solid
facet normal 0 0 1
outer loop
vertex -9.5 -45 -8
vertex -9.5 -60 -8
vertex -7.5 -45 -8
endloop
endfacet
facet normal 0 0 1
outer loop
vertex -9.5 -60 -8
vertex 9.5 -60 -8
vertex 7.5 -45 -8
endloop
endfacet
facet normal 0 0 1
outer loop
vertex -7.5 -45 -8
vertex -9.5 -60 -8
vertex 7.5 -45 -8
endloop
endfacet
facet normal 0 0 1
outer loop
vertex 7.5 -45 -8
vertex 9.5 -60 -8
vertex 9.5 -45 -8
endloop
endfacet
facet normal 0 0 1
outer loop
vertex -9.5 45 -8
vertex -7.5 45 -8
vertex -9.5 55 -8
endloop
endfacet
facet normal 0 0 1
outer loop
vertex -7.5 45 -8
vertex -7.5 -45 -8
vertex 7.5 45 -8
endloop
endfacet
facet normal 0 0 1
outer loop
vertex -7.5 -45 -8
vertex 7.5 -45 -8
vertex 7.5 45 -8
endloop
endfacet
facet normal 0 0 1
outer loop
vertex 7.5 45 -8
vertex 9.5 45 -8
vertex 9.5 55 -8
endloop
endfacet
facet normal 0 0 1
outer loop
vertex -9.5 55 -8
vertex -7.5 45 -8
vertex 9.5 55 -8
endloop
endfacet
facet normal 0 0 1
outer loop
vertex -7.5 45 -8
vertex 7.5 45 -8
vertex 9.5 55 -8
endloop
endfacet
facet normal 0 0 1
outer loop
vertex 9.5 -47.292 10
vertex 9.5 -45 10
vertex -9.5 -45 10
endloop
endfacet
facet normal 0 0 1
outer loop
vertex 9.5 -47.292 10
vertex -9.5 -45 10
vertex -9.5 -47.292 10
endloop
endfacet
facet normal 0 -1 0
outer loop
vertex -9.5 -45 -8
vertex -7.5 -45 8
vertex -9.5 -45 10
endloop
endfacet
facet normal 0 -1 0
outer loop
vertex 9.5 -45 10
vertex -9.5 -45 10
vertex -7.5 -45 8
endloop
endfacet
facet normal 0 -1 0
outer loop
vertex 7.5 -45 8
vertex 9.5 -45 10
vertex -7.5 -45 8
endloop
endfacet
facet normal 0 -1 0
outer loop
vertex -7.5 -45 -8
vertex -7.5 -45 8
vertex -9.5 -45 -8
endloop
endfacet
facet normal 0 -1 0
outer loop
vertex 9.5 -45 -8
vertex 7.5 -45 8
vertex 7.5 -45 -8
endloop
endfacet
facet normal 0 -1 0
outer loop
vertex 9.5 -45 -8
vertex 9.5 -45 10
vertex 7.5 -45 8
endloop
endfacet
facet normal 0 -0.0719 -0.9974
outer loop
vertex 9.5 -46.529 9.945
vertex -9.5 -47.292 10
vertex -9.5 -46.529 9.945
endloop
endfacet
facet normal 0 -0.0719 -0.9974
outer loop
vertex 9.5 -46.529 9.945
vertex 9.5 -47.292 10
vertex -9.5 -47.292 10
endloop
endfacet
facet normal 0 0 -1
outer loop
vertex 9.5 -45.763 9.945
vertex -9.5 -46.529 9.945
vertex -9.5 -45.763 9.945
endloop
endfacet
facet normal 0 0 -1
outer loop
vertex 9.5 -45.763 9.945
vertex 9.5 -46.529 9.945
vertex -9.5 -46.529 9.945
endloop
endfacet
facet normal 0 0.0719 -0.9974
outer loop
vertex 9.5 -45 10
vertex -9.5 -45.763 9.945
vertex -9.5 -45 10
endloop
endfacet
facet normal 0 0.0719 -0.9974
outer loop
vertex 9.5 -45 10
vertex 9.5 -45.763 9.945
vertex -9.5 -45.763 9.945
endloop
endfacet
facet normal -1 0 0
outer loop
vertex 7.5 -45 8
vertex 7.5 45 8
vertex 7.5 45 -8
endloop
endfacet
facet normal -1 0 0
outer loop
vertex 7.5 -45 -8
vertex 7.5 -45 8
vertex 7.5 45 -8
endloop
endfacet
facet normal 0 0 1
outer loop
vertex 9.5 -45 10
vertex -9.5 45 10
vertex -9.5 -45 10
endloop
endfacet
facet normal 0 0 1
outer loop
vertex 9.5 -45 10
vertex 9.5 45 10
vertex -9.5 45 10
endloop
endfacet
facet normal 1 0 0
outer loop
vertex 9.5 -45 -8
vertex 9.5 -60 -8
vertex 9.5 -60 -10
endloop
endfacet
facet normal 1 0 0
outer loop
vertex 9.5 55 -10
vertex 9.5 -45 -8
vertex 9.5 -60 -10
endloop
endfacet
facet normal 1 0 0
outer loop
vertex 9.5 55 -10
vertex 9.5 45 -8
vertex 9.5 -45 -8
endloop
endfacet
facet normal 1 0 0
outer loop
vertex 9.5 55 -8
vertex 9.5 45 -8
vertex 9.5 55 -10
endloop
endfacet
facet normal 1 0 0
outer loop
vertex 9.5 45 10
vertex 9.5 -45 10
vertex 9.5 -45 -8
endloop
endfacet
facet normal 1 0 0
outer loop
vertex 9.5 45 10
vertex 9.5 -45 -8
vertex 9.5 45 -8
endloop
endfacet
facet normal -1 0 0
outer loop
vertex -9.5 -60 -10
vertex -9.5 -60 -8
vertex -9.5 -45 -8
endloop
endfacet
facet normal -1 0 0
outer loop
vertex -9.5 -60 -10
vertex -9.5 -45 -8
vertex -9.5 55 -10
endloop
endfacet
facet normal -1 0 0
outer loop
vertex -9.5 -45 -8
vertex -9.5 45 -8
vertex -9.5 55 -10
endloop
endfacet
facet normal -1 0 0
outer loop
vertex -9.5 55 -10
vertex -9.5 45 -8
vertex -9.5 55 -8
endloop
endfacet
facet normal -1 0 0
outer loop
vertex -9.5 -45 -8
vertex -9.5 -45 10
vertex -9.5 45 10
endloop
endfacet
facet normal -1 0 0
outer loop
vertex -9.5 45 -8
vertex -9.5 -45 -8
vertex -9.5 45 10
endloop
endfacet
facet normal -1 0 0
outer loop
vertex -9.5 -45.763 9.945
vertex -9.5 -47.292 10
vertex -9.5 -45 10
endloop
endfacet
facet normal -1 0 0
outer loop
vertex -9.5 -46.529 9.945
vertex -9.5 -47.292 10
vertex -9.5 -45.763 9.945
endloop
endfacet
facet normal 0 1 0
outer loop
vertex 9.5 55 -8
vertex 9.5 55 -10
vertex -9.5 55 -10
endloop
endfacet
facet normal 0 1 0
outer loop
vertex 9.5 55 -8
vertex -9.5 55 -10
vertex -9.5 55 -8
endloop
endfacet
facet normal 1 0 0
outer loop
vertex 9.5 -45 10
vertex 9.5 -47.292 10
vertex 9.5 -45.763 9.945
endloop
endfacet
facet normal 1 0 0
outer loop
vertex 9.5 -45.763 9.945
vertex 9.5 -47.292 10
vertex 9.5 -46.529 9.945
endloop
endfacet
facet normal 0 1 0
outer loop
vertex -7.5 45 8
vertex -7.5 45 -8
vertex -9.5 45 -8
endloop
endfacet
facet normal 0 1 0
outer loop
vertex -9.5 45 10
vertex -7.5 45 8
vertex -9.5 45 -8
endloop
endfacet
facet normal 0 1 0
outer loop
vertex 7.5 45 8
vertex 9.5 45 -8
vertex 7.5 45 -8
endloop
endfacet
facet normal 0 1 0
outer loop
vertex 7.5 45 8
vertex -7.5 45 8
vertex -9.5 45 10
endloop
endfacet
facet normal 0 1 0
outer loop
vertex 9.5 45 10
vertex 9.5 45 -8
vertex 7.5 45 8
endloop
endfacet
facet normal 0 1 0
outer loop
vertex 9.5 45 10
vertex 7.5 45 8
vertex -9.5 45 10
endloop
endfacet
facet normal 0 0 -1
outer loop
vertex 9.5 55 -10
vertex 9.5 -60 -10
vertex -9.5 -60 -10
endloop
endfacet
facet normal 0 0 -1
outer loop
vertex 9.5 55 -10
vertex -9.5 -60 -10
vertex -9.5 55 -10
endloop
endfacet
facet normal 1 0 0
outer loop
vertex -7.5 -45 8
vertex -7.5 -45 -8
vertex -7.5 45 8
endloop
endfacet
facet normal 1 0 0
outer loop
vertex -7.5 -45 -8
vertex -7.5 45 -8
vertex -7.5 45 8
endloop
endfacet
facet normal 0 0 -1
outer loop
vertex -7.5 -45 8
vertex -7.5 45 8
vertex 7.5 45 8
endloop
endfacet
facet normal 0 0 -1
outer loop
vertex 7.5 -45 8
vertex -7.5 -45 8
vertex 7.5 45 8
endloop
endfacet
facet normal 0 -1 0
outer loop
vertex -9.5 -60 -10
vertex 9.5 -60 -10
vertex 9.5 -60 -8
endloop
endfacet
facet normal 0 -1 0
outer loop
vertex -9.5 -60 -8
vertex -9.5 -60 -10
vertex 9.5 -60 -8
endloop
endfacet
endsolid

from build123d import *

# Parameters (mm, degrees)
F0_W     = 10
F0_H     = 2
F0_W_2   = 15
F1_DEPTH = 9.5
F2_T     = -2


# Not quite as in the source:
# - a shell that OpenCascade refuses in one call is made with other operations: the cavity is built on its own and cut out


with BuildPart() as f1:
    # F0 (on Right) → F1 (new body, symmetric)
    with BuildSketch(Plane.YZ):
        Polygon((45, 10), (-45, 10), (-45, 8), (-45, 0), (-45, -8), (-45, -10), (45, -10), (45, -8), align=None)
        with Locations((50, -9)):
            Rectangle(F0_W, F0_H)
        with Locations((-52.5, -9)):
            Rectangle(F0_W_2, F0_H)
    extrude(amount=F1_DEPTH, both=True)

    # F2: a shell. OpenCascade refuses it in one call, so the cavity is built on its own and cut out:
    # the body offset inwards by the wall thickness, plus a prism from it out through each open face.
    f2_core = offset(f1.part, amount=F2_T, kind=Kind.INTERSECTION, mode=Mode.PRIVATE)
    f2_exits = [f2_core.faces().sort_by_distance(p)[0] for p in [
        (0, -43, 0),
        (0, 43, 0),
    ]]
    add(f2_core, mode=Mode.SUBTRACT)
    extrude(f2_exits, amount=-F2_T, mode=Mode.SUBTRACT)


with BuildPart() as f1b:
    # F0 (on Right) → F1, piece 2 (new body, symmetric)
    with BuildSketch(Plane.YZ):
        with BuildLine():
            ThreePointArc((-47.2923916416, 10), (-46.1461958208, 9.938642669), (-45, 10))
            Line((-45, 10), (-47.2923916416, 10))
        make_face()
    extrude(amount=F1_DEPTH, both=True)


solid = Compound([f1.part, f1b.part])
